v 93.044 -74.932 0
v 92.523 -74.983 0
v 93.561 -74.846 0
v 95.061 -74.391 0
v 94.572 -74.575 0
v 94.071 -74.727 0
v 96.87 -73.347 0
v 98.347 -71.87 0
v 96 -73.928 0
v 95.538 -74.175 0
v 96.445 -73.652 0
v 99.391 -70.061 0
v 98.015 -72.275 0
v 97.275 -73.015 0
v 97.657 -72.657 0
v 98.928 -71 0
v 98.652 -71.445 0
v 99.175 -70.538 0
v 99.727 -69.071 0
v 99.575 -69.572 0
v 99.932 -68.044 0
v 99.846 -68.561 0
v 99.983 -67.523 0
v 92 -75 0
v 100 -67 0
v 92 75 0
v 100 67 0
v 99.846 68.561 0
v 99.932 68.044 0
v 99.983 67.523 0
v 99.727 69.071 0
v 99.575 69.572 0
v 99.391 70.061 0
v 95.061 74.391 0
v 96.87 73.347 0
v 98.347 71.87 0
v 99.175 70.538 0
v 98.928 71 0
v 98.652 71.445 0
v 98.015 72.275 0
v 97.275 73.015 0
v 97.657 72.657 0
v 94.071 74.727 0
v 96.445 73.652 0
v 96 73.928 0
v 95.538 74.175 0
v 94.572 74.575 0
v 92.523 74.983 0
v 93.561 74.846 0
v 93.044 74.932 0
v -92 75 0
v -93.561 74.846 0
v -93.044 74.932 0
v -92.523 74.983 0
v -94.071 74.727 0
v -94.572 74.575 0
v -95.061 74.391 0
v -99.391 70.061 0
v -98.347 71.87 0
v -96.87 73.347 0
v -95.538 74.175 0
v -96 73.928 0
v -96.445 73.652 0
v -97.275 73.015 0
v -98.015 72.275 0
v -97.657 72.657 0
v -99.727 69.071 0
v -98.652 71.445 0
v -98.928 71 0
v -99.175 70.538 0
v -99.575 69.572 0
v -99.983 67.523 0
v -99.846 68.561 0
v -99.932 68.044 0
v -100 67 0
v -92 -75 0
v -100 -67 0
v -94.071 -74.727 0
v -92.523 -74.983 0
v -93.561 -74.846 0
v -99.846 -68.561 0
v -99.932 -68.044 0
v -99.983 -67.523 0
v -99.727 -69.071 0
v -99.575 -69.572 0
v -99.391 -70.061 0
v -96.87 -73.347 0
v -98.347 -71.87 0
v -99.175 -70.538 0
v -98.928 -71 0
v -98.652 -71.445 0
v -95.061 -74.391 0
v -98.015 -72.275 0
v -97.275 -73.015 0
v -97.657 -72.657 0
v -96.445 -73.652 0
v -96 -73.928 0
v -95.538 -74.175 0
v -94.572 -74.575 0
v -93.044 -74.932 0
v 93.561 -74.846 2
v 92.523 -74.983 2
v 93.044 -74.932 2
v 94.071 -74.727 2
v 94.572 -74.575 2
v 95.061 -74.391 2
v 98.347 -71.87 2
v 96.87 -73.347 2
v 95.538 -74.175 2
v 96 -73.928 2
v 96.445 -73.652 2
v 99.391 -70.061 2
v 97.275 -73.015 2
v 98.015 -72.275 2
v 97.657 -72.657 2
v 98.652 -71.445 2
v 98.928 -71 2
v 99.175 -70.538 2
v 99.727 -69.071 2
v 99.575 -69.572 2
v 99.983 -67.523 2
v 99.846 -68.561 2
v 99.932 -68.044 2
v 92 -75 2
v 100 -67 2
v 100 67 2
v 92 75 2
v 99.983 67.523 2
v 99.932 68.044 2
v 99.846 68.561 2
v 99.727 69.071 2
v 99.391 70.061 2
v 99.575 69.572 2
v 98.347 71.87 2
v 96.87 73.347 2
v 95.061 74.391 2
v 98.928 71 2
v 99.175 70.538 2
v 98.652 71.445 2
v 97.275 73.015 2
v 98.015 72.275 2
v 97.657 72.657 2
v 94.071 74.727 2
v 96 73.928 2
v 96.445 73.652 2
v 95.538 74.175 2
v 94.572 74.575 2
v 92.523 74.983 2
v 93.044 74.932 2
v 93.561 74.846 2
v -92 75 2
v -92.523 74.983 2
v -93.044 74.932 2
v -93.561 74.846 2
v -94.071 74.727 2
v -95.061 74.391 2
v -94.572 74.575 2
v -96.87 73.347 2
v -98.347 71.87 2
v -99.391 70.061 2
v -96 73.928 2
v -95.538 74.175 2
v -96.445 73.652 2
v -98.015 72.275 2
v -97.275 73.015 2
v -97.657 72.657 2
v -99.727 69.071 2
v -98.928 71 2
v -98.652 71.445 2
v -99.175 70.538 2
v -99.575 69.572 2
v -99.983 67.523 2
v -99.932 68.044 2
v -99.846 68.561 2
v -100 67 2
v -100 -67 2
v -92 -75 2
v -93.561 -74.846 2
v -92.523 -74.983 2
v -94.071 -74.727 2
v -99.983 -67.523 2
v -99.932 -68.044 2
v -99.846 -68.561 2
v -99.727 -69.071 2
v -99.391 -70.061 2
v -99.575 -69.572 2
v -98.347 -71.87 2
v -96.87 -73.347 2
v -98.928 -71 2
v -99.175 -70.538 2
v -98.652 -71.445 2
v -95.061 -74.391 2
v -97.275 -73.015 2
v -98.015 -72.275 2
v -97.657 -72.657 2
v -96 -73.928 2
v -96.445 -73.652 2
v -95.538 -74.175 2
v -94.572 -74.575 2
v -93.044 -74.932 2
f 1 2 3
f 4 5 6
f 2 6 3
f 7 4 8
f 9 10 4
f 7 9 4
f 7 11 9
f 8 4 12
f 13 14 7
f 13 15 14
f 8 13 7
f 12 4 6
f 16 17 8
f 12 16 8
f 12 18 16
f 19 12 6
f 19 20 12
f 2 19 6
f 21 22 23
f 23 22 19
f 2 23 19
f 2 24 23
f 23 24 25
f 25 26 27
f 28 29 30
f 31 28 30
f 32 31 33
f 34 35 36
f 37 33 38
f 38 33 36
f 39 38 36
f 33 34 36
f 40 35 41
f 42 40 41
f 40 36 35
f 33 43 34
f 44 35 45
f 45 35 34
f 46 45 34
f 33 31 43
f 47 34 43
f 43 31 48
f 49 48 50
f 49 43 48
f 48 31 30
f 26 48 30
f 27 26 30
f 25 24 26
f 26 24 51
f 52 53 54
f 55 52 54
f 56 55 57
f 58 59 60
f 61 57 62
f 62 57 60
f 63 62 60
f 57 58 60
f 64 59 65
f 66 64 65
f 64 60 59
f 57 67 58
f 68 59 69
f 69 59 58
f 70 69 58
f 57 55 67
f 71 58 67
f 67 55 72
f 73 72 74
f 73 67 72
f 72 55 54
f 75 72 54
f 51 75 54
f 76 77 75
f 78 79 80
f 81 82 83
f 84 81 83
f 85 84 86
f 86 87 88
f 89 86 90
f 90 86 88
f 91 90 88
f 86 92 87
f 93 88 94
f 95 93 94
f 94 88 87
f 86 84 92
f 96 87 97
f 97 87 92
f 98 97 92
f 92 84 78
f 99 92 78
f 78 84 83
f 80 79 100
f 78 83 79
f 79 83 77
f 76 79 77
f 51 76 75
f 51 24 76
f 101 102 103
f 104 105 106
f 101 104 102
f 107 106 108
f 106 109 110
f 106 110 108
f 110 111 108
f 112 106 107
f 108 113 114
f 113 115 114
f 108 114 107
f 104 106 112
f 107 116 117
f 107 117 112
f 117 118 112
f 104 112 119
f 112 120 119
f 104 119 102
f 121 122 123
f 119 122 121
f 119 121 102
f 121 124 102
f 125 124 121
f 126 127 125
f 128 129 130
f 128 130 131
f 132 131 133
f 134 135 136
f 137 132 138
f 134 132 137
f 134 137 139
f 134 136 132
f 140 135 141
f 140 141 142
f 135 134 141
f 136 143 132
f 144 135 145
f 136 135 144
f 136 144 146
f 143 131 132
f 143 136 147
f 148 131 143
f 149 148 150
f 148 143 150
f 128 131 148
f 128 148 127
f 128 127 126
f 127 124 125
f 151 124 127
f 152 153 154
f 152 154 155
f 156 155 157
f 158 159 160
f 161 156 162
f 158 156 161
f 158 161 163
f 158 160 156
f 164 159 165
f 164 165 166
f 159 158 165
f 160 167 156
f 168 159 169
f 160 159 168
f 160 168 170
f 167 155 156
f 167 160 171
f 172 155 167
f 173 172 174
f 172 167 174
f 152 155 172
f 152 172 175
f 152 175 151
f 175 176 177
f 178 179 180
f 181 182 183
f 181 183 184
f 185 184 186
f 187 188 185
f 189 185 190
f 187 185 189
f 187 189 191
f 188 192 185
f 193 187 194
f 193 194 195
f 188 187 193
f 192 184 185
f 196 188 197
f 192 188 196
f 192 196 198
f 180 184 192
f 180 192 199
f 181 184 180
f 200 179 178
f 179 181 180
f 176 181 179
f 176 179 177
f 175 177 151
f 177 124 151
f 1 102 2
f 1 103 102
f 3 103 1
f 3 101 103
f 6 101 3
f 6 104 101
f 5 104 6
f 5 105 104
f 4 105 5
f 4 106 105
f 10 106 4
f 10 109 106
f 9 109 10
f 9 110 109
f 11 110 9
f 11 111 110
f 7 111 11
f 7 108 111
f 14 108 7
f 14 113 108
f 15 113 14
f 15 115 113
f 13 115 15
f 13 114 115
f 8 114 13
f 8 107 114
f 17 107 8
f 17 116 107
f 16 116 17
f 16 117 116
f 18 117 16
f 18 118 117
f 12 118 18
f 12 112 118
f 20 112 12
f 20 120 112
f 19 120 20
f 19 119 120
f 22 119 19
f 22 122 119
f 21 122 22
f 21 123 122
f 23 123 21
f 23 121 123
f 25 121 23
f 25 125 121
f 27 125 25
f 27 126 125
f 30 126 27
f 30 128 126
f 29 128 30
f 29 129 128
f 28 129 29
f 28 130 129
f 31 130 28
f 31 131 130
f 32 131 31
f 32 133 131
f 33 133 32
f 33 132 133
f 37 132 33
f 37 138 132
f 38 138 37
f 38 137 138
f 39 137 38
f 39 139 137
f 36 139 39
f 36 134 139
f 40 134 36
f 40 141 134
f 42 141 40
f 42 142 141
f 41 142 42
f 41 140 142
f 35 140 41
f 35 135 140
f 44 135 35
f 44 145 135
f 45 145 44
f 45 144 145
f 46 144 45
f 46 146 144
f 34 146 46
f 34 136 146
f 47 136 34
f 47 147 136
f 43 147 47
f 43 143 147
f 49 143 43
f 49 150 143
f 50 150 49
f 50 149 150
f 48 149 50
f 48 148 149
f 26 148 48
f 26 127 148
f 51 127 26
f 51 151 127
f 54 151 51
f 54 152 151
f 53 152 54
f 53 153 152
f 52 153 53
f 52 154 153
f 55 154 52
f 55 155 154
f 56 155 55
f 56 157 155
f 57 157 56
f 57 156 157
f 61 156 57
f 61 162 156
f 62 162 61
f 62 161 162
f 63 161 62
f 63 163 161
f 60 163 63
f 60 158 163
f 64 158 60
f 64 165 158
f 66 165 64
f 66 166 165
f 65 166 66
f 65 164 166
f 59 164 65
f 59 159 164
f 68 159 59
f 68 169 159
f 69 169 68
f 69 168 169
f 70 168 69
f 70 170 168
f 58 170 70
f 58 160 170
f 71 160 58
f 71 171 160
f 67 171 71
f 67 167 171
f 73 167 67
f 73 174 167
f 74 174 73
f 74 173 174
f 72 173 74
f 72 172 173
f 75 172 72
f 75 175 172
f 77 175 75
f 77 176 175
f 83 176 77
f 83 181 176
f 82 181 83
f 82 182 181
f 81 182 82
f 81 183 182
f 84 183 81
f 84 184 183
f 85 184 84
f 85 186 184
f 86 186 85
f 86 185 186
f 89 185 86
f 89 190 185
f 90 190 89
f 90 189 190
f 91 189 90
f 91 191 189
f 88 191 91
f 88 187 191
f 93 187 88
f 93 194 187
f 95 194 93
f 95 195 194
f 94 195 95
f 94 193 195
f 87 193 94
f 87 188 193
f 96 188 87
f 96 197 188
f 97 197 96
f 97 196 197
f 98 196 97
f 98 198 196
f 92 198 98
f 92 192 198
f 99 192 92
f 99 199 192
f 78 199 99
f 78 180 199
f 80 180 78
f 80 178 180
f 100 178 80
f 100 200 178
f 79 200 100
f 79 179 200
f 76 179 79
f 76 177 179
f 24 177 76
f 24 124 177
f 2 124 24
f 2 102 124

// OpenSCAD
$fn = 96;

length = 200;
width  = 150;
thickness = 2;

corner_radius = 8;

module rounded_sheet(l, w, t, r){
    r2 = min(r, min(l, w)/2);
    linear_extrude(height = t)
        offset(r = r2)
            square([l - 2*r2, w - 2*r2], center = true);
}

color([0.85, 0.85, 0.9, 0.55])
    rounded_sheet(length, width, thickness, corner_radius);
